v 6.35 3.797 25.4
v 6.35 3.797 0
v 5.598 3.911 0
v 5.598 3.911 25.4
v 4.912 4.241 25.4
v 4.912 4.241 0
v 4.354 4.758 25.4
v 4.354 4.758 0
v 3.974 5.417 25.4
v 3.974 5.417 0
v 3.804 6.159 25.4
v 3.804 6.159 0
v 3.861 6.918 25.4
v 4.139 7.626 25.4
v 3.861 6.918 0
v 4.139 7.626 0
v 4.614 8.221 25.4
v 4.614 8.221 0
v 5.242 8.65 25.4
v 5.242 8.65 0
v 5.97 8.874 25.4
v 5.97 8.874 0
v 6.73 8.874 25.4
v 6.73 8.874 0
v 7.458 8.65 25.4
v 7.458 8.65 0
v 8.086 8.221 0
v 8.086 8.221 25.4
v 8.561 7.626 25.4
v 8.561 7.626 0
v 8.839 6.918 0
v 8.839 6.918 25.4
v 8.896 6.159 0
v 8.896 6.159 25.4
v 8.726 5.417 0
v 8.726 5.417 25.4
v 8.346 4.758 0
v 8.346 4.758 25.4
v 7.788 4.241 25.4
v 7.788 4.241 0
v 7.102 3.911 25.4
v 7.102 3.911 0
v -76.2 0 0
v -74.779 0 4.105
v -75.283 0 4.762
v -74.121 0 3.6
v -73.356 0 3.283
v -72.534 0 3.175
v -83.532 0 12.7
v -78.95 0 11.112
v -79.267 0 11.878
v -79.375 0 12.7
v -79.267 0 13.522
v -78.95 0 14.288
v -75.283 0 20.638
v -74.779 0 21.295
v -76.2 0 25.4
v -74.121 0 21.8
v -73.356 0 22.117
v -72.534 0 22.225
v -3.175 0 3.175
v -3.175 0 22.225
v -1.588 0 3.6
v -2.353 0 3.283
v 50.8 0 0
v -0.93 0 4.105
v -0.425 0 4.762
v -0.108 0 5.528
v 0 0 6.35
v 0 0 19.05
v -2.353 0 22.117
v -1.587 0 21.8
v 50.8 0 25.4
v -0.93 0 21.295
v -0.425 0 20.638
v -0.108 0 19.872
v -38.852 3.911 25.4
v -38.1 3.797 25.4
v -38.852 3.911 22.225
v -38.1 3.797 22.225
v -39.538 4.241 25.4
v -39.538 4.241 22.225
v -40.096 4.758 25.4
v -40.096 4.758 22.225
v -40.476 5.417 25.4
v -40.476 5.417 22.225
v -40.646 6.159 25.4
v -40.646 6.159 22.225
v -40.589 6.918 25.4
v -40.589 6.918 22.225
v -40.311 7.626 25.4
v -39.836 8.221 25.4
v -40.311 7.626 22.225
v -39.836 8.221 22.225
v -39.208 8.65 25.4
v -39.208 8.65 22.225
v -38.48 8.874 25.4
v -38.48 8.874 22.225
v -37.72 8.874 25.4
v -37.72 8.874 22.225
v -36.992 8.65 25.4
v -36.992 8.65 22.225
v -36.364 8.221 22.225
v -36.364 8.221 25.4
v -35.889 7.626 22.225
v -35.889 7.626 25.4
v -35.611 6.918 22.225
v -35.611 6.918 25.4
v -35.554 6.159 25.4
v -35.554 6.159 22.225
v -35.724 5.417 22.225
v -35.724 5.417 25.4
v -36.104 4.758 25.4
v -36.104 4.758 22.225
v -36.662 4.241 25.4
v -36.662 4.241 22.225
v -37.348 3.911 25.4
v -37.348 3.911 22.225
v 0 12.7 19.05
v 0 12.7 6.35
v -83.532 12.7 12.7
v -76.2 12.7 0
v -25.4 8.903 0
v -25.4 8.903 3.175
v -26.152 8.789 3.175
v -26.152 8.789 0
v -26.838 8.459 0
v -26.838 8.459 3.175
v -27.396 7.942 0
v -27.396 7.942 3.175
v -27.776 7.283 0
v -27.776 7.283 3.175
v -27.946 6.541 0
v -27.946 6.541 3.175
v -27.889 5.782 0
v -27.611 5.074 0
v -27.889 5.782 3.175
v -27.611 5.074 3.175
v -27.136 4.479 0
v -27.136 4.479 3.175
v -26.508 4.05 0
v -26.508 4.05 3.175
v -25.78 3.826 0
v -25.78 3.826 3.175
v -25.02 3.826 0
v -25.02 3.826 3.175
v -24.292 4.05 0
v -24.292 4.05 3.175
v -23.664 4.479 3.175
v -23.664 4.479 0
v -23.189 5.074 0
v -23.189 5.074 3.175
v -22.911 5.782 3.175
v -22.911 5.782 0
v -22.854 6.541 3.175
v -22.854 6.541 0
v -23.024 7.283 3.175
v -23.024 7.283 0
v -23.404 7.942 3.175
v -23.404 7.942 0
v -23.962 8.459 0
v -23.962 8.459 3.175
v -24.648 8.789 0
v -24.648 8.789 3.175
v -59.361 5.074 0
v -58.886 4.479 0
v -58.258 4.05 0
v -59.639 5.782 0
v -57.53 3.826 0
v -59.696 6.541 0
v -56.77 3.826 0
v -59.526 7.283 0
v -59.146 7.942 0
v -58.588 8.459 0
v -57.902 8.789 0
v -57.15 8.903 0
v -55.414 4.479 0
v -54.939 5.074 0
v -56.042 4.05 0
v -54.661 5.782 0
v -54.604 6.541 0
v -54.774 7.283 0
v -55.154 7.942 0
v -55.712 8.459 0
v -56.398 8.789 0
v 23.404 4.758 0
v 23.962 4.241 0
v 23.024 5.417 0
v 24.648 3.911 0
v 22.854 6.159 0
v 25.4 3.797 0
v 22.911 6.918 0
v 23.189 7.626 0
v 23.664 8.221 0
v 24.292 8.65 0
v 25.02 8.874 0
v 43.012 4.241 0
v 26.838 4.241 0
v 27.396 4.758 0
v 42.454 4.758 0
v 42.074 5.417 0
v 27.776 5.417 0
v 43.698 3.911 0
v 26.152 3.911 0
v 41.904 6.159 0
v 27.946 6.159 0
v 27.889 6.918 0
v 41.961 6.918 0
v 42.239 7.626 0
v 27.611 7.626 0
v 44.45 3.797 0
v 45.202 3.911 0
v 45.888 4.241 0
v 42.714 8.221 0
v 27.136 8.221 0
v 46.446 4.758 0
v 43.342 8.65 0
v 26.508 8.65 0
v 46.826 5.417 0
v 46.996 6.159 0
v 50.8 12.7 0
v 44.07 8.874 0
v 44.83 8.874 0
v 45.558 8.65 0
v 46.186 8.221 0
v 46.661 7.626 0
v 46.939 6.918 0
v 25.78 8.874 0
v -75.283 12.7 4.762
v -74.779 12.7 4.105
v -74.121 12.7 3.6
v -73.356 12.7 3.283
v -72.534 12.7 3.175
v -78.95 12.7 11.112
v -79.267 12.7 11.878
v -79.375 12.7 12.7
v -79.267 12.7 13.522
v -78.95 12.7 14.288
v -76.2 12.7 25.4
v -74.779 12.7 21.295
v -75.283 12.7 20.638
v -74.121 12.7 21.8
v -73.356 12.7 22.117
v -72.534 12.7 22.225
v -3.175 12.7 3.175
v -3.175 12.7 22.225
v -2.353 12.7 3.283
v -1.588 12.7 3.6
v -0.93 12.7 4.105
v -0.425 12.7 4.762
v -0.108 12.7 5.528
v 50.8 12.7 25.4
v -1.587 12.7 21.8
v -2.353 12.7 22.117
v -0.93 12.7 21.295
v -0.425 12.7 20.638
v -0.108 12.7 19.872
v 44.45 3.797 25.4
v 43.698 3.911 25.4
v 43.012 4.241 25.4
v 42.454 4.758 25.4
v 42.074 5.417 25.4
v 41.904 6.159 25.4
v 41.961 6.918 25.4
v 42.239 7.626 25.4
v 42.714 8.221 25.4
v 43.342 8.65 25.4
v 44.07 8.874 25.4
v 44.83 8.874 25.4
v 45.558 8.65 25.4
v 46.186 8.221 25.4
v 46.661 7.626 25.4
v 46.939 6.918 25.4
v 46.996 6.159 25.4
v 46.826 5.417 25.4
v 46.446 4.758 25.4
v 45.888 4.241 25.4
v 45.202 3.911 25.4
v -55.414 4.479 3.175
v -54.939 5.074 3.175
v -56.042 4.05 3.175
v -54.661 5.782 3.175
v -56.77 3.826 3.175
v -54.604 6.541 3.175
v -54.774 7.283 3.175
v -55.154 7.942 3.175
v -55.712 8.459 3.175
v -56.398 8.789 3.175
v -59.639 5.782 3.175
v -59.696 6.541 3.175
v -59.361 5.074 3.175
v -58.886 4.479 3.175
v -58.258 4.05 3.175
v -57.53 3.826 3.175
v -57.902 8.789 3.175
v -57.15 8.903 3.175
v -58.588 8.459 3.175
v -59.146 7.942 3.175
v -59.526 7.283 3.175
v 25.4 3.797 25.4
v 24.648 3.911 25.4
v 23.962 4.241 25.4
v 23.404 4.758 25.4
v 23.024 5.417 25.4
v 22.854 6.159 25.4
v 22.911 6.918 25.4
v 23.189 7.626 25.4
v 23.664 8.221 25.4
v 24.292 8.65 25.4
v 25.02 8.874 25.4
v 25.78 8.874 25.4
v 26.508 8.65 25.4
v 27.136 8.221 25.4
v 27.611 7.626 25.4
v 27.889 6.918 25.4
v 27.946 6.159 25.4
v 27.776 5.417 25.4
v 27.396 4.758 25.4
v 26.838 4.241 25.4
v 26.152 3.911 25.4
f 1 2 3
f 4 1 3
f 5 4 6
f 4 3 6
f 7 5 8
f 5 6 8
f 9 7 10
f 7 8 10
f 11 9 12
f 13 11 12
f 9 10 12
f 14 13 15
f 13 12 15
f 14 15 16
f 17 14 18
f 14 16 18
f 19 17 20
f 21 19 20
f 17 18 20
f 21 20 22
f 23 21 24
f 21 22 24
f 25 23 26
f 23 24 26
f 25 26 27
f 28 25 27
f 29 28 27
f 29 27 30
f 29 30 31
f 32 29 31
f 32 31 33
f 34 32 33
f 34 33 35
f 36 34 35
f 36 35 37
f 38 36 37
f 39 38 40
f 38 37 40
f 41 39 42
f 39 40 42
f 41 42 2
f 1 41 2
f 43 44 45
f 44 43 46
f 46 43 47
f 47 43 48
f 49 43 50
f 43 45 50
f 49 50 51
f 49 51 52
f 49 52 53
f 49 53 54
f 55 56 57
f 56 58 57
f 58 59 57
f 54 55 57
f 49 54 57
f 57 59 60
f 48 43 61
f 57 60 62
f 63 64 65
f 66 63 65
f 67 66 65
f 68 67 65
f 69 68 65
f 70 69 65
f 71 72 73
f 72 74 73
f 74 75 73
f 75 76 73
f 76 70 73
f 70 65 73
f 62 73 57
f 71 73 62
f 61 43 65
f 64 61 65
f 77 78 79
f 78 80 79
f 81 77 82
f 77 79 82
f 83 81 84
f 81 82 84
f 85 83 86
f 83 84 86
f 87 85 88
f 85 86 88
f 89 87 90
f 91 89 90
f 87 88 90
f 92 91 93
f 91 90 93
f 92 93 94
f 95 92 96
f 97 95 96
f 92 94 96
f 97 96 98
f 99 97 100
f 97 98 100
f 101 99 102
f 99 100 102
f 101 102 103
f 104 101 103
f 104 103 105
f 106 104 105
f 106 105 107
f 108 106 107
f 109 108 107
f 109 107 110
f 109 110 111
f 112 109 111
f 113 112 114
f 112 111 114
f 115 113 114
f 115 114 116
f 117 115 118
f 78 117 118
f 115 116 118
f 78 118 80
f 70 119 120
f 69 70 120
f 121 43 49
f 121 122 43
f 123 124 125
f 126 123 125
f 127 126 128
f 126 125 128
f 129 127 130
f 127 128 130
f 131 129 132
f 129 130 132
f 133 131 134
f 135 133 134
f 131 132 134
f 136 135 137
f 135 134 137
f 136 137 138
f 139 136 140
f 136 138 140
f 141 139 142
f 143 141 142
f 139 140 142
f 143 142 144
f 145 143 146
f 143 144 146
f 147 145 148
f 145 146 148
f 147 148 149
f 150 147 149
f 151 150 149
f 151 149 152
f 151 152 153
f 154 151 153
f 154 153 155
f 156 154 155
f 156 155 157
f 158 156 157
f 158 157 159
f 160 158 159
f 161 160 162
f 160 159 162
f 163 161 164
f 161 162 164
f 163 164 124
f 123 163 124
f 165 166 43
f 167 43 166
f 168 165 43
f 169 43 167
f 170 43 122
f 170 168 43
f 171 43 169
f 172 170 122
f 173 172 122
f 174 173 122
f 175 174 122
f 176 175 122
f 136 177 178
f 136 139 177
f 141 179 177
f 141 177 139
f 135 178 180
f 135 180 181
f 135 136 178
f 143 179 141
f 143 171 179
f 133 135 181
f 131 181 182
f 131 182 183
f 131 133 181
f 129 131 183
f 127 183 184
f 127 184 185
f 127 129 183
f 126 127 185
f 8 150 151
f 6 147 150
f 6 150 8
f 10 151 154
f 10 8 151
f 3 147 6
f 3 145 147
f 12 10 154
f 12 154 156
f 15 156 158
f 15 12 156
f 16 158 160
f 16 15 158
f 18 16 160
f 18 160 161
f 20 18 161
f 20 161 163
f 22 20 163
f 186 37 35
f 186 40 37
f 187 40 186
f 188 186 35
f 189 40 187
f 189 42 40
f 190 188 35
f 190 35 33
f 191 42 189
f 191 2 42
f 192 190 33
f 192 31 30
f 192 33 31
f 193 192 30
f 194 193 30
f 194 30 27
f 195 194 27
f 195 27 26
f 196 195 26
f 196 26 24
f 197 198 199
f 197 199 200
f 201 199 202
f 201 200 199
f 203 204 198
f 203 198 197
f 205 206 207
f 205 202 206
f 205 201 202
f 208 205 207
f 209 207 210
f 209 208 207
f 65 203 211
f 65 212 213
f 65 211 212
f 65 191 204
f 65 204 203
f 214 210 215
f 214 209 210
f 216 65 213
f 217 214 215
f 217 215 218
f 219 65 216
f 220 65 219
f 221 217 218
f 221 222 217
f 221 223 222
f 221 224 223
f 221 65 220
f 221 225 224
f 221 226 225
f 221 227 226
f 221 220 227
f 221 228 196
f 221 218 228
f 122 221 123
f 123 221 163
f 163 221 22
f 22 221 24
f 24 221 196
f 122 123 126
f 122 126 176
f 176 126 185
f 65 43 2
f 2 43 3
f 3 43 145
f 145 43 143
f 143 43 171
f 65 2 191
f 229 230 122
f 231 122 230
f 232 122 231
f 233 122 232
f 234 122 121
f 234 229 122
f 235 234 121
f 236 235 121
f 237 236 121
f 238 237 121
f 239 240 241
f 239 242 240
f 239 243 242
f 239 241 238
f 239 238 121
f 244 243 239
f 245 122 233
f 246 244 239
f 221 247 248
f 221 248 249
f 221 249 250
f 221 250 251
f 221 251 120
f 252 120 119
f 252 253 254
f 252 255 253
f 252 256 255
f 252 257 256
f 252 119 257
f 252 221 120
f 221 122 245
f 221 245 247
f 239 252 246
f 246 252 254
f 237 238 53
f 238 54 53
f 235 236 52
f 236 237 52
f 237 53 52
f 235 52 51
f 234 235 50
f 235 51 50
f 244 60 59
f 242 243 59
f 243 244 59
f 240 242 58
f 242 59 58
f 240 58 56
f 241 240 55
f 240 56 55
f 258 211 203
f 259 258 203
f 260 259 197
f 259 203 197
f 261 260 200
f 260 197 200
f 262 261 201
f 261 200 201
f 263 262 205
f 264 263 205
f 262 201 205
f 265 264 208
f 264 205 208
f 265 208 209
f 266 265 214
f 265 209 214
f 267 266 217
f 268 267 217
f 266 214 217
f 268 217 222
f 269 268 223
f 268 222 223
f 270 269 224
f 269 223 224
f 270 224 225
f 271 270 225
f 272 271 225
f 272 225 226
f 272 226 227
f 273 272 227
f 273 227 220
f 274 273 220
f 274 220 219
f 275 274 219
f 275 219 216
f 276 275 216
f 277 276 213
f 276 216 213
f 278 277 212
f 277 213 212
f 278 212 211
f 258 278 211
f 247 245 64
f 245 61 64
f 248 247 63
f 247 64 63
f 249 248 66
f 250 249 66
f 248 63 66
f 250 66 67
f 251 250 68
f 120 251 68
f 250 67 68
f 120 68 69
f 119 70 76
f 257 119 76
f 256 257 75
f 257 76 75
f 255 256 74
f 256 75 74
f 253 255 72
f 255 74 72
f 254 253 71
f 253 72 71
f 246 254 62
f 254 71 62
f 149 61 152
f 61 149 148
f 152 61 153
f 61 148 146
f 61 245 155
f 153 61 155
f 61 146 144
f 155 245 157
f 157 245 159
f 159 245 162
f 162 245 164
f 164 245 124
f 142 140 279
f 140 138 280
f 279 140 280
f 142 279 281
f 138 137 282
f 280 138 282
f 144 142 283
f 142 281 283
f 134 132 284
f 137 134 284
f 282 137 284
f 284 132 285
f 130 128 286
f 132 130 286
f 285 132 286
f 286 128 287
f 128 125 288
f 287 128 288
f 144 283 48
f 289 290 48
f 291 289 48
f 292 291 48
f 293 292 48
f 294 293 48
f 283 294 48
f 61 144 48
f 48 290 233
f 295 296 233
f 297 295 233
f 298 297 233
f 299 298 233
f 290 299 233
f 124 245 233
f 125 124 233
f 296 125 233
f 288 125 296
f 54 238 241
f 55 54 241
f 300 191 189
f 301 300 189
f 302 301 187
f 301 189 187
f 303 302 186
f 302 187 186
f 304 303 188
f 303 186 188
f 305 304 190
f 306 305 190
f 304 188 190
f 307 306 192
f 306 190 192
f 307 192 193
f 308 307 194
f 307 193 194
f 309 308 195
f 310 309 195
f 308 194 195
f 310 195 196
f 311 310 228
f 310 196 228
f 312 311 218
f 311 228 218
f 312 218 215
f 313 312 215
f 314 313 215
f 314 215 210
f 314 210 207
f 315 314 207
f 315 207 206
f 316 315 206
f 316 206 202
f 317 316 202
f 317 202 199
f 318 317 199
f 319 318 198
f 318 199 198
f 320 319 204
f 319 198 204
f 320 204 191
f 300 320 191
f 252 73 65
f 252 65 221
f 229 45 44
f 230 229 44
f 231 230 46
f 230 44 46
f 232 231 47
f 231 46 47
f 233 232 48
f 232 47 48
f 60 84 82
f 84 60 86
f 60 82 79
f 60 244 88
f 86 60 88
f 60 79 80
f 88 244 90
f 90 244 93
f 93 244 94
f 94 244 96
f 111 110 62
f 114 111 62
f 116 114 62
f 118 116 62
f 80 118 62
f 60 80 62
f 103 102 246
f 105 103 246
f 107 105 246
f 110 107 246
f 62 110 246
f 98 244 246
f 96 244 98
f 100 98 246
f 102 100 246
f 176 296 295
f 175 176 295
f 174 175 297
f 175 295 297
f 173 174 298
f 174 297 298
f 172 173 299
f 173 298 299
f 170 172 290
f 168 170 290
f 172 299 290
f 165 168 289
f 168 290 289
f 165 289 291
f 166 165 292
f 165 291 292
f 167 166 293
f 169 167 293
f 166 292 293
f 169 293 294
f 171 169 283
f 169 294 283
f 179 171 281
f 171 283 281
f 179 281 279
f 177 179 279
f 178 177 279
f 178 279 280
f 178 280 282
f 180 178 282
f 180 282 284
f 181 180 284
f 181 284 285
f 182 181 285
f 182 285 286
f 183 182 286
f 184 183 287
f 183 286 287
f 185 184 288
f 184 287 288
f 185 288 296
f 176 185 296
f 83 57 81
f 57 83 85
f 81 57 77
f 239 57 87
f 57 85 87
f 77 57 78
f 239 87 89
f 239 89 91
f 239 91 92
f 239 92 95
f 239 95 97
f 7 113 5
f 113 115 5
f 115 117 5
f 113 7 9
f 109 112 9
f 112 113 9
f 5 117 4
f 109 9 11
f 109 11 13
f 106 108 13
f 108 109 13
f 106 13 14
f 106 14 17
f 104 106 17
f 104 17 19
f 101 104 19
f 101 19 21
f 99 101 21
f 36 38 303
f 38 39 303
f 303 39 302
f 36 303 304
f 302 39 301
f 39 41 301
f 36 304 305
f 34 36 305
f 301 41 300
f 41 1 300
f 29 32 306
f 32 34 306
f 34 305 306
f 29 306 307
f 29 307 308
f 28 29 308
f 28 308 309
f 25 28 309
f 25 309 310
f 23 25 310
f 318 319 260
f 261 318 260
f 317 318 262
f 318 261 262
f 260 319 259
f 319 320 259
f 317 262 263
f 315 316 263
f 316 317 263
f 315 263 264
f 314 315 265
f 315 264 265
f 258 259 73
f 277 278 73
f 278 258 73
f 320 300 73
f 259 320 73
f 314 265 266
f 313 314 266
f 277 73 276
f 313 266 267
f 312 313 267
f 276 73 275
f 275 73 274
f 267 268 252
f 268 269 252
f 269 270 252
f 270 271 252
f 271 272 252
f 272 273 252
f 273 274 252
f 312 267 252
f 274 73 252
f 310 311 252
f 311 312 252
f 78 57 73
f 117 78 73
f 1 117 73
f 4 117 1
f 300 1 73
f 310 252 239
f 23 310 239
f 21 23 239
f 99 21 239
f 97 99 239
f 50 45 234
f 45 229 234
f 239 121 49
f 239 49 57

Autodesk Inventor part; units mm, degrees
ref_plane "YZ Plane" through (0, 0, 0) normal (1, 0, 0) x (0, 1, 0)
ref_plane "XZ Plane" through (0, 0, 0) normal (0, 1, 0) x (-1, 0, 0)
ref_plane "XY Plane" through (0, 0, 0) normal (0, 0, 1) x (1, 0, 0)
sketch "Sketch1" plane through (0, 0, 0) normal (0, 0, 1) x (1, 0, 0)
  line L0 (0, 0) -> (50.8, 0)
  line L1 (50.8, 0) -> (50.8, 12.7)
  line L2 (50.8, 12.7) -> (0, 12.7)
  line L3 (0, 12.7) -> (0, 0)
  dimension "d0" = 50.8
  dimension "d1" = 12.7
extrude "Extrusion1" add sketch "Sketch1" along normal blind 25.4
sketch "Sketch2" plane through (0, 0, 25.4) normal (0, 0, 1) x (1, 0, 0)
  line L0 (50.8, 12.7) -> (0, 12.7) construction
  line L1 (50.8, 0) -> (50.8, 12.7) construction
  line L2 (0, 12.7) -> (50.8, 12.7) construction
  line L3 (50.8, 12.7) -> (50.8, 6.35) construction
  line L4 (50.8, 6.35) -> (0, 6.35) construction
  line L5 (0, 6.35) -> (0, 12.7) construction
  point P0 (0, 0)
  point P1 (25.4, 6.35)
  point P2 (6.35, 6.35)
  point P3 (44.45, 6.35)
  dimension "d4" = 6.35
  dimension "d5" = 19.05
  dimension "d6" = 19.05
hole "Hole1" at (25.4, 6.35, 25.4) at (6.35, 6.35, 25.4) at (44.45, 6.35, 25.4) direction (0, 0, -1) diameter 5.1054 end through all clearance for "Hex Machine Screw" size "#10" standard "Ansi Unified Screw Threads"
sketch "Sketch3" plane through (0, 0, 0) normal (-1, 0, 0) x (0, 0, 1)
  line L0 (0, 0) -> (0, 12.7) projected
  line L1 (0, 12.7) -> (25.4, 12.7) projected
  line L2 (0, 0) -> (25.4, 0)
  line L3 (25.4, 0) -> (25.4, 12.7)
  line L4 (25.4, 12.7) -> (0, 12.7)
  line L5 (0, 12.7) -> (0, 0)
extrude "Extrusion2" add sketch "Sketch3" along normal blind 76.2
sketch "Sketch4" plane through (50.8, 12.7, 25.4) normal (0, 1, 0) x (1, 0, 0)
  line L0 (-127, 25.4) -> (-127, 0) projected
  line L1 (-127, 12.7) -> (-134.3323, 12.7)
  line L2 (-134.3323, 12.7) -> (-127, 0)
  line L3 (-127, 0) -> (-127, 25.4)
  line L4 (-127, 25.4) -> (-134.3323, 12.7)
  point P0 (-50.8, 25.4)
  dimension "d16" = 7.3323
extrude "Extrusion3" add sketch "Sketch4" against normal up to surface (12.7 mm away)
sketch "Sketch5" plane through (50.8, 12.7, 25.4) normal (0, 1, 0) x (1, 0, 0)
  line L0 (-134.3323, 12.7) -> (-127, 0) projected
  line L1 (-127, 25.4) -> (-134.3323, 12.7) projected
  line L2 (0, 25.4) -> (-127, 25.4) projected
  line L3 (0, 0) -> (-127, 0) projected
  line L4 (0, 25.4) -> (0, 0) projected
  line L5 (-125.1669, 22.225) -> (-130.6662, 12.7)
  line L6 (-130.6662, 12.7) -> (-125.1669, 3.175)
  line L7 (-125.1669, 3.175) -> (-50.8, 3.175)
  line L8 (-50.8, 3.175) -> (-50.8, 22.225)
  line L9 (-50.8, 22.225) -> (-125.1669, 22.225)
  point P0 (-50.8, 25.4)
  dimension "d19" = 3.175
  dimension "d20" = 3.175
  dimension "d21" = 3.175
  dimension "d22" = 3.175
  dimension "d23" = 3.175
  dimension "d24" = 3.175
  dimension "d25" = 3.175
  dimension "d26" = 3.175
  dimension "d27" = 50.8
  dimension "d28" = 50.8
extrude "Extrusion4" cut sketch "Sketch5" against normal through all contours L9 L8 L7 L6 L5
sketch "Sketch6" plane through (0, 0, 0) normal (0, 0, 1) x (1, 0, 0)
  line L0 (-76.2, 0) -> (-76.2, 12.7) construction
  line L1 (-76.2, 6.35) -> (50.8, 6.35) construction
  line L2 (50.8, 0) -> (50.8, 12.7) construction
  point P0 (0, 0)
  point P1 (-57.15, 6.35)
  point P2 (-25.4, 6.35)
  dimension "d31" = 31.75
  dimension "d32" = 19.05
hole "Hole2" at (-57.15, 6.35, 0) at (-25.4, 6.35, 0) direction (0, 0, 1) diameter 5.1054 depth 8.89 clearance for "Flat Head Machine Screw (82)" size "#10" standard "Ansi Unified Screw Threads"
sketch "Sketch7" plane through (0, 0, 25.4) normal (0, 0, 1) x (1, 0, 0)
  line L0 (-76.2, 0) -> (-76.2, 12.7) construction
  line L1 (-76.2, 6.35) -> (50.8, 6.35) construction
  line L2 (50.8, 0) -> (50.8, 12.7) construction
  point P0 (0, 0)
  point P1 (-38.1, 6.35)
  dimension "d40" = 38.1
hole "Hole3" at (-38.1, 6.35, 25.4) direction (0, 0, -1) diameter 5.1054 depth 16.51 clearance for "Flat Head Machine Screw (82)" size "#10" standard "Ansi Unified Screw Threads"
fillet "Fillet1" radius 3.175 5 edges at (0, 6.35, 3.175) (0, 6.35, 22.225) (-74.3669, 6.35, 3.175) (-79.8662, 6.35, 12.7) (-74.3669, 6.35, 22.225)
chamfer "Chamfer1" [suppressed]
properties part number "Third Baseplate Spacer"
